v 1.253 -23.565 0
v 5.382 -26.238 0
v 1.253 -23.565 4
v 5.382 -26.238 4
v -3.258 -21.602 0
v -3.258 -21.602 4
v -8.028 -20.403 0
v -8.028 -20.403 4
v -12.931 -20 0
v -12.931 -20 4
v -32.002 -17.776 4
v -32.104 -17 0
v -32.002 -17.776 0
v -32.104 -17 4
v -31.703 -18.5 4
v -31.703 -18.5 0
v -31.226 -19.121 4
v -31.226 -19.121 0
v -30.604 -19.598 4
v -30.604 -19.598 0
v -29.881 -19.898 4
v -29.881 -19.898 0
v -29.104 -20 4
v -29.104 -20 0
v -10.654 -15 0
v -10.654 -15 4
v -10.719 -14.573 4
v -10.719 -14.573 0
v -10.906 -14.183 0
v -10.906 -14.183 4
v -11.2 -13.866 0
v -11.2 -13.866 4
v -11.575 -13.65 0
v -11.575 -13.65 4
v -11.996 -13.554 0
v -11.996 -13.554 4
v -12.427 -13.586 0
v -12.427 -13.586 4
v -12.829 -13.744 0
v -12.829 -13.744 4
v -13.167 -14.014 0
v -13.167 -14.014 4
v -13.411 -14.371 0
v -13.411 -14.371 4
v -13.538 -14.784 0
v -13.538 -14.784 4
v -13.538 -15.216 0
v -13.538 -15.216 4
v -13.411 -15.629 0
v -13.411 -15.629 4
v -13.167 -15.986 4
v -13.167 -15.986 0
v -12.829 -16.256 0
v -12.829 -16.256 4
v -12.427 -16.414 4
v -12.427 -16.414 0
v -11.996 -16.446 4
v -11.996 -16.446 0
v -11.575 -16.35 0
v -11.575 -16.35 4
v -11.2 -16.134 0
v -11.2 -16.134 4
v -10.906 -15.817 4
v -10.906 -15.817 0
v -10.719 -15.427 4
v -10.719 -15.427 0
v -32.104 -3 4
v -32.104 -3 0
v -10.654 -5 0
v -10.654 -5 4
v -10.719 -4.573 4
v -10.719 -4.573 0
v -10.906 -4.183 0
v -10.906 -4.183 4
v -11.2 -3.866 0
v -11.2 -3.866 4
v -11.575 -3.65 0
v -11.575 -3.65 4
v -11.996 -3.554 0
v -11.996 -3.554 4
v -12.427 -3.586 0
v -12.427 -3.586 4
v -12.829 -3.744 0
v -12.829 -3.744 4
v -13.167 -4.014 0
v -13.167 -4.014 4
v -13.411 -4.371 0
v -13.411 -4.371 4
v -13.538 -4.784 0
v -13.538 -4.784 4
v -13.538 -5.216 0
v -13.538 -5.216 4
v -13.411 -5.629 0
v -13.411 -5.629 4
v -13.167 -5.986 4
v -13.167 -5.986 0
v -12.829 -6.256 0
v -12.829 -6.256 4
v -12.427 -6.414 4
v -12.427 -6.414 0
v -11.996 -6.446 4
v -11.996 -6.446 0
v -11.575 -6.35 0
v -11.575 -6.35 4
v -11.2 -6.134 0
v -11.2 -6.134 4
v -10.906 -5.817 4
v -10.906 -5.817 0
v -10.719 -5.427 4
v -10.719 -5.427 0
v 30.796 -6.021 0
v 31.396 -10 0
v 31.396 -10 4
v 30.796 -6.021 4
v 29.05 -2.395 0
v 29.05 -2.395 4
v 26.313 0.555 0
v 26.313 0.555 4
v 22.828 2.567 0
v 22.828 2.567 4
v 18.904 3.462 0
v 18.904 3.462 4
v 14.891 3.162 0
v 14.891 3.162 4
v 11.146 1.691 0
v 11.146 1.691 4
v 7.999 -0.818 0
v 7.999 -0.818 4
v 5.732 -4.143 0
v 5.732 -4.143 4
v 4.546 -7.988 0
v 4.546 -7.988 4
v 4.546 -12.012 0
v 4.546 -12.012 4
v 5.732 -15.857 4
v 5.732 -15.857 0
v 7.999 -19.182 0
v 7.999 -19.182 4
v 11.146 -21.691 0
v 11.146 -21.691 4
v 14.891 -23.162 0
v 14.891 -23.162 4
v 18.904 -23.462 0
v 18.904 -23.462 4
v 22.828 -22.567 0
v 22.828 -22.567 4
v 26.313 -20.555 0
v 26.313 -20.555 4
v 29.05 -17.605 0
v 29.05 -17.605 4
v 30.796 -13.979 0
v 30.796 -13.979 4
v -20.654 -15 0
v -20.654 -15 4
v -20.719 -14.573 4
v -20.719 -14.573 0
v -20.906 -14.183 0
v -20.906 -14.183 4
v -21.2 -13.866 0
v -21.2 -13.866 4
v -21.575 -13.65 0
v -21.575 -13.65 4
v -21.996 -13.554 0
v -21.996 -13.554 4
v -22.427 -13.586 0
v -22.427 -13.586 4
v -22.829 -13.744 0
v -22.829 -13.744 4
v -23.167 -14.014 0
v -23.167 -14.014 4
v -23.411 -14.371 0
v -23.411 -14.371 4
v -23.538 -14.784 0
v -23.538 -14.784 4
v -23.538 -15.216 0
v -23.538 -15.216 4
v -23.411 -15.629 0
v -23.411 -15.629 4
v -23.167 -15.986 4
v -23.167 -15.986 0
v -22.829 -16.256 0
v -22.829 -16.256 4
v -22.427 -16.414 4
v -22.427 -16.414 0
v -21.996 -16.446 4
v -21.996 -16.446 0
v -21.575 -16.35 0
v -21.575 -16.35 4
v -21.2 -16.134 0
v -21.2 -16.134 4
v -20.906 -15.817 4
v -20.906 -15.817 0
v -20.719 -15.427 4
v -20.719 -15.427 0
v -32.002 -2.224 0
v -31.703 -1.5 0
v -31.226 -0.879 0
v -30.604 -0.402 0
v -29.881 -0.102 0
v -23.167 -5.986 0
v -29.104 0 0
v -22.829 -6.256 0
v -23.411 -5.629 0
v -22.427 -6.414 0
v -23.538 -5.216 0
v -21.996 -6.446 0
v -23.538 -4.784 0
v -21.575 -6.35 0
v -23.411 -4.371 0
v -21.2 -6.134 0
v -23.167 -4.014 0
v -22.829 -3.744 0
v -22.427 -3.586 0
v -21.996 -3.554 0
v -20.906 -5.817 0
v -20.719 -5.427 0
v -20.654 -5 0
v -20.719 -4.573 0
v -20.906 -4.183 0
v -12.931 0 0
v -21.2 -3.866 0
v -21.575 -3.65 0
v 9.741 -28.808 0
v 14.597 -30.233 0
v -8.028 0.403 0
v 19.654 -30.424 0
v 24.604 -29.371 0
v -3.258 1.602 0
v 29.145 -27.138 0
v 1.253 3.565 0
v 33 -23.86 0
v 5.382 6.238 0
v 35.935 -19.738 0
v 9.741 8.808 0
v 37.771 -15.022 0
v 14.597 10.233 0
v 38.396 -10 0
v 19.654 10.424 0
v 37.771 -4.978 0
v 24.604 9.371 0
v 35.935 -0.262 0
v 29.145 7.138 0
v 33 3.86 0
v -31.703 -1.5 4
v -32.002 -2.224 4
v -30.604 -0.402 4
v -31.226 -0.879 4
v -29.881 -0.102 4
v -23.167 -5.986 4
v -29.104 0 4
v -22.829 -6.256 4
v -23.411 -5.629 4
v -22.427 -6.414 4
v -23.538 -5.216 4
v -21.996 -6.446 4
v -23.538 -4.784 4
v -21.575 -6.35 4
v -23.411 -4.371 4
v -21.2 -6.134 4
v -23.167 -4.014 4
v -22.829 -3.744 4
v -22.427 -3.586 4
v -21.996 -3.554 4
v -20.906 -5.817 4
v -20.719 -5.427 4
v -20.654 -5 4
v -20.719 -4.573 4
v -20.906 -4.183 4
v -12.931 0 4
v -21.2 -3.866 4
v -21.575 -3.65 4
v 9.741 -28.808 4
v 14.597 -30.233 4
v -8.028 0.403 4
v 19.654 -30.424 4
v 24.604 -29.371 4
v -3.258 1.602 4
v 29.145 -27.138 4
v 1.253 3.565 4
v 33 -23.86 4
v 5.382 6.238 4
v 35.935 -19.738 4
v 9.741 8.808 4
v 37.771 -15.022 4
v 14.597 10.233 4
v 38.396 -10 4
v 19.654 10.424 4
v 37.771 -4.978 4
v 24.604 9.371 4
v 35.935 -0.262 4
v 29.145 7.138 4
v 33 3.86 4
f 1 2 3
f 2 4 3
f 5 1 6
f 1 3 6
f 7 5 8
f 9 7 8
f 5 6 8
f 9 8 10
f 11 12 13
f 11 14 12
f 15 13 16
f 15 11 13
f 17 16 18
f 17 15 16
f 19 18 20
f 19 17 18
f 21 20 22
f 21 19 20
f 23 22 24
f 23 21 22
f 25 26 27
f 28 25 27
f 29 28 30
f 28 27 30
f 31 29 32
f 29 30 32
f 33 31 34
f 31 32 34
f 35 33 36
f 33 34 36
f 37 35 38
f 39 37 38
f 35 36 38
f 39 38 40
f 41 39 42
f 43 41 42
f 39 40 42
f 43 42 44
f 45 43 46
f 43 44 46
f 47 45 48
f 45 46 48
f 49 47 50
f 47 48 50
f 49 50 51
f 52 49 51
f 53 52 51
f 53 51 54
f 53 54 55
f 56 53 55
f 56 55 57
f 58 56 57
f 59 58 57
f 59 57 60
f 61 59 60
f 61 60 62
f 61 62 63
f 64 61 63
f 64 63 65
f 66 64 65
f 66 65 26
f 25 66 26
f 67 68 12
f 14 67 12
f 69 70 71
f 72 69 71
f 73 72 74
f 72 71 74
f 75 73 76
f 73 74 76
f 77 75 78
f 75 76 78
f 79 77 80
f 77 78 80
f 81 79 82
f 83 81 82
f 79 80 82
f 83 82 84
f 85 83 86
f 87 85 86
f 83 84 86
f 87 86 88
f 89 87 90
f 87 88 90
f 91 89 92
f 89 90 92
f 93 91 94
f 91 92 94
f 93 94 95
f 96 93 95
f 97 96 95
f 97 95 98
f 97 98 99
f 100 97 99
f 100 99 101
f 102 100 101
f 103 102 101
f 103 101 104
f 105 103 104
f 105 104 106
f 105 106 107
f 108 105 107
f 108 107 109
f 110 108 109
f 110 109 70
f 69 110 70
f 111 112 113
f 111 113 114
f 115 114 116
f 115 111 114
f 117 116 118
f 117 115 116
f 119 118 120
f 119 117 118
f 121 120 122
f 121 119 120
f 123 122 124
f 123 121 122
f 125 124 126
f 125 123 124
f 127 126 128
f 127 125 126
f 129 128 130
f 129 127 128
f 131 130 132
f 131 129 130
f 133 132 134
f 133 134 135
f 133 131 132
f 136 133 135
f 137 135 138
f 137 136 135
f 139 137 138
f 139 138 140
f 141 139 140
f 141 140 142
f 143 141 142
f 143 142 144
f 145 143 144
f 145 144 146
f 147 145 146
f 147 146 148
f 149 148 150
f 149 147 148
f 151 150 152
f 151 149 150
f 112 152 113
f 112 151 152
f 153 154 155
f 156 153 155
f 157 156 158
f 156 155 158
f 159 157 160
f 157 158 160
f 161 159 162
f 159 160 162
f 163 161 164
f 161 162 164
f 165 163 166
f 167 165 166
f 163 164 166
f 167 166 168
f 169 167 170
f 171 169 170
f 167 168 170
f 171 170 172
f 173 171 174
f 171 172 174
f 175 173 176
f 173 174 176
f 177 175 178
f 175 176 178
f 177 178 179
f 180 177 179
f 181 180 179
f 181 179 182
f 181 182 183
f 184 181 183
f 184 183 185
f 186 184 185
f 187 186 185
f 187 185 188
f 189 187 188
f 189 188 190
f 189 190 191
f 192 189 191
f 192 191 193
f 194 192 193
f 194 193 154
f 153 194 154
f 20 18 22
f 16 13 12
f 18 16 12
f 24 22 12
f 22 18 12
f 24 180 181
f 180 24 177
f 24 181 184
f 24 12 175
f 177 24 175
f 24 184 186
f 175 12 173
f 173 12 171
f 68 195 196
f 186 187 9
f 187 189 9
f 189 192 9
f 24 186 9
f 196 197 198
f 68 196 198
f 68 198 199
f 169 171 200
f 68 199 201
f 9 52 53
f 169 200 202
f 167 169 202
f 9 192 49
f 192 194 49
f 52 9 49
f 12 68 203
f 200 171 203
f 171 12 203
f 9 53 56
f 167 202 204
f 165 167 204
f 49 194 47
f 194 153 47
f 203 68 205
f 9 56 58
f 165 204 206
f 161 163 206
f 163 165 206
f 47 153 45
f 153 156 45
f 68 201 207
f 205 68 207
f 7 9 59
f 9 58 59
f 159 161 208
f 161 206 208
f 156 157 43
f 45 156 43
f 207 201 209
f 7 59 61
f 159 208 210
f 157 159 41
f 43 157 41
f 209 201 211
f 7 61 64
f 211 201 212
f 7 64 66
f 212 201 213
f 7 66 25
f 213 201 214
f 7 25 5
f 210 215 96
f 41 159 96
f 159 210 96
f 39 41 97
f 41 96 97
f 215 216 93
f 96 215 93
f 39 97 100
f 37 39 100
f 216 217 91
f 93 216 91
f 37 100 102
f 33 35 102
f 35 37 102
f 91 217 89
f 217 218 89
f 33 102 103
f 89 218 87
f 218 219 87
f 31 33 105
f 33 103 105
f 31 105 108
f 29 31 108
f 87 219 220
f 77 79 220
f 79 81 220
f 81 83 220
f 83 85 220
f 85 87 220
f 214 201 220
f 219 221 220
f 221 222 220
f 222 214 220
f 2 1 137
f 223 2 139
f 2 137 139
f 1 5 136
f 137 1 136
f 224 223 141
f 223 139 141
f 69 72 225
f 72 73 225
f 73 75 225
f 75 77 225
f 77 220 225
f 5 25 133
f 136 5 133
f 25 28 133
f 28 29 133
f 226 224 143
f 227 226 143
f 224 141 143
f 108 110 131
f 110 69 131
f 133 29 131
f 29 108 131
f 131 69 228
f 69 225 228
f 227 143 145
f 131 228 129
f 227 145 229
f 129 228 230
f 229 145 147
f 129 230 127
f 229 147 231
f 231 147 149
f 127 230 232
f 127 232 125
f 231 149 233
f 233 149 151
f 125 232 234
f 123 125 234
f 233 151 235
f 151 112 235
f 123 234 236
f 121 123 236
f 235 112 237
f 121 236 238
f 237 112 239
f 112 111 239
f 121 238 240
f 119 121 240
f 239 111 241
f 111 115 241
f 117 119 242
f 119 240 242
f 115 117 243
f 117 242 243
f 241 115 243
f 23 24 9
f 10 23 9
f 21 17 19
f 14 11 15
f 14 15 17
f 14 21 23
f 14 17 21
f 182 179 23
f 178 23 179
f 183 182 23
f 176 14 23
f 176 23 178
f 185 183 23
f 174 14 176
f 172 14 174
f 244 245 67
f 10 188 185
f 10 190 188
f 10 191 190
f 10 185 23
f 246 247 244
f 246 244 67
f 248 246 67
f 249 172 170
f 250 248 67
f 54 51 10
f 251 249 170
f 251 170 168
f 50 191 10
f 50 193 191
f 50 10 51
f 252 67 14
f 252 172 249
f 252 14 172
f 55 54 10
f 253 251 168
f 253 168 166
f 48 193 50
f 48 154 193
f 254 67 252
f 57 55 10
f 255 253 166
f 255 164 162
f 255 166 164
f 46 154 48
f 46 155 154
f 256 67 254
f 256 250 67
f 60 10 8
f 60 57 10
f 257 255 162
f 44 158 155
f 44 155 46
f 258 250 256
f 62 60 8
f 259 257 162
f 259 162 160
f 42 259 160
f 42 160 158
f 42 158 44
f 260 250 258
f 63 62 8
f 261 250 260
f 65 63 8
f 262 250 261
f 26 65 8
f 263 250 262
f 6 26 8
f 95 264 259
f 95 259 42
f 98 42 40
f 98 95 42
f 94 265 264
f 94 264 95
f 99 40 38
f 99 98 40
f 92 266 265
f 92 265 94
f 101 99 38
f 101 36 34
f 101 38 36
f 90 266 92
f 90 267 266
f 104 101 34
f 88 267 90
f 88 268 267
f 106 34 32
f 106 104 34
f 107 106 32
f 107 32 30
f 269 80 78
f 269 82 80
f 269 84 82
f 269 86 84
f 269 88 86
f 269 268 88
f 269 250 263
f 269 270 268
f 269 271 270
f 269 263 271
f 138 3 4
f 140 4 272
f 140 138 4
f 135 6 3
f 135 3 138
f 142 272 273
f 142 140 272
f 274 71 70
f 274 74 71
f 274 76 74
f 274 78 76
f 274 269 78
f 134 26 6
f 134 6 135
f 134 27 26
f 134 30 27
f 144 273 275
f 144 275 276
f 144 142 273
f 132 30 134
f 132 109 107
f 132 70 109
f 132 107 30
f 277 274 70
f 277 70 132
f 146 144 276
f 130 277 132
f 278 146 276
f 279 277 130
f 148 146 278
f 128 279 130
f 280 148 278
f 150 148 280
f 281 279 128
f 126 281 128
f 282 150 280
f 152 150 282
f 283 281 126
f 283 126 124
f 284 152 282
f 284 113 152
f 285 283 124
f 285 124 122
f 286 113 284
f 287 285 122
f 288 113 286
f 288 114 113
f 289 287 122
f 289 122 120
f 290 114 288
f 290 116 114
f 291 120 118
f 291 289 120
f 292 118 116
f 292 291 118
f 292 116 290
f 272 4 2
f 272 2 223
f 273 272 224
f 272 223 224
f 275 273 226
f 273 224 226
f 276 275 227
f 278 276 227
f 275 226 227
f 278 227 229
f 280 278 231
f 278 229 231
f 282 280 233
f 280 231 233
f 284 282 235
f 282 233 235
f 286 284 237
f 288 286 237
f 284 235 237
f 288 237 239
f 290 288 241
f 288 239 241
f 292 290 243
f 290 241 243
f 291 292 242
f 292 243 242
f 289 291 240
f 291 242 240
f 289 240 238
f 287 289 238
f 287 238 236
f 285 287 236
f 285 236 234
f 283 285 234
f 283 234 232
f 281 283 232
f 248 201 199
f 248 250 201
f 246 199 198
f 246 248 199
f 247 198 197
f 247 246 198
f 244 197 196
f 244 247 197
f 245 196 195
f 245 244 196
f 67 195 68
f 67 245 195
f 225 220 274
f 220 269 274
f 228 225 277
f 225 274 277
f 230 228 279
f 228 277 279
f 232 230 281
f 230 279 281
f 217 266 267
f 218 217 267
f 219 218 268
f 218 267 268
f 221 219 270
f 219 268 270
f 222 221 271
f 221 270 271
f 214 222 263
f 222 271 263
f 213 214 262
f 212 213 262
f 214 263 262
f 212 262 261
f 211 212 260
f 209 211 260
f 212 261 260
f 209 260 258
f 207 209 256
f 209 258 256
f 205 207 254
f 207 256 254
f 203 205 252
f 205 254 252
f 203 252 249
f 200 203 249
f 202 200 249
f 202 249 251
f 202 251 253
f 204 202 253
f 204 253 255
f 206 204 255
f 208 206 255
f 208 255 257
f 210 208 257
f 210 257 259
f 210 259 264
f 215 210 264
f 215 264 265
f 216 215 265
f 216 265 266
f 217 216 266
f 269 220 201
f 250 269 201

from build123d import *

# Parameters (mm, degrees)
SKETCH_1_R          = 13.5
EXTRUDE_1_DEPTH     = 4
SKETCH_2_R          = 1.45
CUT_EXTRUDE_1_DEPTH = 50.198239165
FILLET_1_R          = 30
FILLET_2_R          = 3


with BuildPart() as part:
    # 草图1 → 凸台-拉伸1 (new body)
    with BuildSketch(Plane.XY):
        with BuildLine():
            Line((0, 0), (-32.104469832, 0))
            Line((-32.104469832, 0), (-32.104469832, -20))
            Line((-32.104469832, -20), (0, -20))
            ThreePointArc((0, -20), (38.395530168, -10), (0, 0))
        make_face()
        with Locations((17.895530168, -10)):
            Circle(SKETCH_1_R, mode=Mode.SUBTRACT)
    extrude(amount=EXTRUDE_1_DEPTH)

    # 草图2 → 切除-拉伸1 (cut, through all)
    with BuildSketch(Plane.XY.offset(4)):
        with Locations((-22.104469832, -5)):
            Circle(SKETCH_2_R)
        with Locations((-12.104469832, -5)):
            Circle(SKETCH_2_R)
        with Locations((-12.104469832, -15)):
            Circle(SKETCH_2_R)
        with Locations((-22.104469832, -15)):
            Circle(SKETCH_2_R)
    extrude(amount=-CUT_EXTRUDE_1_DEPTH, mode=Mode.SUBTRACT)

    # 圆角1
    fillet_1_edges = [part.edges().sort_by_distance(p)[0] for p in [
        (0, -20, 2),
        (0, 0, 2),
    ]]
    fillet(fillet_1_edges, radius=FILLET_1_R)

    # 圆角2
    fillet_2_edges = [part.edges().sort_by_distance(p)[0] for p in [
        (-32.104469832, -20, 2),
        (-32.104469832, 0, 2),
    ]]
    fillet(fillet_2_edges, radius=FILLET_2_R)


solid = part.part
